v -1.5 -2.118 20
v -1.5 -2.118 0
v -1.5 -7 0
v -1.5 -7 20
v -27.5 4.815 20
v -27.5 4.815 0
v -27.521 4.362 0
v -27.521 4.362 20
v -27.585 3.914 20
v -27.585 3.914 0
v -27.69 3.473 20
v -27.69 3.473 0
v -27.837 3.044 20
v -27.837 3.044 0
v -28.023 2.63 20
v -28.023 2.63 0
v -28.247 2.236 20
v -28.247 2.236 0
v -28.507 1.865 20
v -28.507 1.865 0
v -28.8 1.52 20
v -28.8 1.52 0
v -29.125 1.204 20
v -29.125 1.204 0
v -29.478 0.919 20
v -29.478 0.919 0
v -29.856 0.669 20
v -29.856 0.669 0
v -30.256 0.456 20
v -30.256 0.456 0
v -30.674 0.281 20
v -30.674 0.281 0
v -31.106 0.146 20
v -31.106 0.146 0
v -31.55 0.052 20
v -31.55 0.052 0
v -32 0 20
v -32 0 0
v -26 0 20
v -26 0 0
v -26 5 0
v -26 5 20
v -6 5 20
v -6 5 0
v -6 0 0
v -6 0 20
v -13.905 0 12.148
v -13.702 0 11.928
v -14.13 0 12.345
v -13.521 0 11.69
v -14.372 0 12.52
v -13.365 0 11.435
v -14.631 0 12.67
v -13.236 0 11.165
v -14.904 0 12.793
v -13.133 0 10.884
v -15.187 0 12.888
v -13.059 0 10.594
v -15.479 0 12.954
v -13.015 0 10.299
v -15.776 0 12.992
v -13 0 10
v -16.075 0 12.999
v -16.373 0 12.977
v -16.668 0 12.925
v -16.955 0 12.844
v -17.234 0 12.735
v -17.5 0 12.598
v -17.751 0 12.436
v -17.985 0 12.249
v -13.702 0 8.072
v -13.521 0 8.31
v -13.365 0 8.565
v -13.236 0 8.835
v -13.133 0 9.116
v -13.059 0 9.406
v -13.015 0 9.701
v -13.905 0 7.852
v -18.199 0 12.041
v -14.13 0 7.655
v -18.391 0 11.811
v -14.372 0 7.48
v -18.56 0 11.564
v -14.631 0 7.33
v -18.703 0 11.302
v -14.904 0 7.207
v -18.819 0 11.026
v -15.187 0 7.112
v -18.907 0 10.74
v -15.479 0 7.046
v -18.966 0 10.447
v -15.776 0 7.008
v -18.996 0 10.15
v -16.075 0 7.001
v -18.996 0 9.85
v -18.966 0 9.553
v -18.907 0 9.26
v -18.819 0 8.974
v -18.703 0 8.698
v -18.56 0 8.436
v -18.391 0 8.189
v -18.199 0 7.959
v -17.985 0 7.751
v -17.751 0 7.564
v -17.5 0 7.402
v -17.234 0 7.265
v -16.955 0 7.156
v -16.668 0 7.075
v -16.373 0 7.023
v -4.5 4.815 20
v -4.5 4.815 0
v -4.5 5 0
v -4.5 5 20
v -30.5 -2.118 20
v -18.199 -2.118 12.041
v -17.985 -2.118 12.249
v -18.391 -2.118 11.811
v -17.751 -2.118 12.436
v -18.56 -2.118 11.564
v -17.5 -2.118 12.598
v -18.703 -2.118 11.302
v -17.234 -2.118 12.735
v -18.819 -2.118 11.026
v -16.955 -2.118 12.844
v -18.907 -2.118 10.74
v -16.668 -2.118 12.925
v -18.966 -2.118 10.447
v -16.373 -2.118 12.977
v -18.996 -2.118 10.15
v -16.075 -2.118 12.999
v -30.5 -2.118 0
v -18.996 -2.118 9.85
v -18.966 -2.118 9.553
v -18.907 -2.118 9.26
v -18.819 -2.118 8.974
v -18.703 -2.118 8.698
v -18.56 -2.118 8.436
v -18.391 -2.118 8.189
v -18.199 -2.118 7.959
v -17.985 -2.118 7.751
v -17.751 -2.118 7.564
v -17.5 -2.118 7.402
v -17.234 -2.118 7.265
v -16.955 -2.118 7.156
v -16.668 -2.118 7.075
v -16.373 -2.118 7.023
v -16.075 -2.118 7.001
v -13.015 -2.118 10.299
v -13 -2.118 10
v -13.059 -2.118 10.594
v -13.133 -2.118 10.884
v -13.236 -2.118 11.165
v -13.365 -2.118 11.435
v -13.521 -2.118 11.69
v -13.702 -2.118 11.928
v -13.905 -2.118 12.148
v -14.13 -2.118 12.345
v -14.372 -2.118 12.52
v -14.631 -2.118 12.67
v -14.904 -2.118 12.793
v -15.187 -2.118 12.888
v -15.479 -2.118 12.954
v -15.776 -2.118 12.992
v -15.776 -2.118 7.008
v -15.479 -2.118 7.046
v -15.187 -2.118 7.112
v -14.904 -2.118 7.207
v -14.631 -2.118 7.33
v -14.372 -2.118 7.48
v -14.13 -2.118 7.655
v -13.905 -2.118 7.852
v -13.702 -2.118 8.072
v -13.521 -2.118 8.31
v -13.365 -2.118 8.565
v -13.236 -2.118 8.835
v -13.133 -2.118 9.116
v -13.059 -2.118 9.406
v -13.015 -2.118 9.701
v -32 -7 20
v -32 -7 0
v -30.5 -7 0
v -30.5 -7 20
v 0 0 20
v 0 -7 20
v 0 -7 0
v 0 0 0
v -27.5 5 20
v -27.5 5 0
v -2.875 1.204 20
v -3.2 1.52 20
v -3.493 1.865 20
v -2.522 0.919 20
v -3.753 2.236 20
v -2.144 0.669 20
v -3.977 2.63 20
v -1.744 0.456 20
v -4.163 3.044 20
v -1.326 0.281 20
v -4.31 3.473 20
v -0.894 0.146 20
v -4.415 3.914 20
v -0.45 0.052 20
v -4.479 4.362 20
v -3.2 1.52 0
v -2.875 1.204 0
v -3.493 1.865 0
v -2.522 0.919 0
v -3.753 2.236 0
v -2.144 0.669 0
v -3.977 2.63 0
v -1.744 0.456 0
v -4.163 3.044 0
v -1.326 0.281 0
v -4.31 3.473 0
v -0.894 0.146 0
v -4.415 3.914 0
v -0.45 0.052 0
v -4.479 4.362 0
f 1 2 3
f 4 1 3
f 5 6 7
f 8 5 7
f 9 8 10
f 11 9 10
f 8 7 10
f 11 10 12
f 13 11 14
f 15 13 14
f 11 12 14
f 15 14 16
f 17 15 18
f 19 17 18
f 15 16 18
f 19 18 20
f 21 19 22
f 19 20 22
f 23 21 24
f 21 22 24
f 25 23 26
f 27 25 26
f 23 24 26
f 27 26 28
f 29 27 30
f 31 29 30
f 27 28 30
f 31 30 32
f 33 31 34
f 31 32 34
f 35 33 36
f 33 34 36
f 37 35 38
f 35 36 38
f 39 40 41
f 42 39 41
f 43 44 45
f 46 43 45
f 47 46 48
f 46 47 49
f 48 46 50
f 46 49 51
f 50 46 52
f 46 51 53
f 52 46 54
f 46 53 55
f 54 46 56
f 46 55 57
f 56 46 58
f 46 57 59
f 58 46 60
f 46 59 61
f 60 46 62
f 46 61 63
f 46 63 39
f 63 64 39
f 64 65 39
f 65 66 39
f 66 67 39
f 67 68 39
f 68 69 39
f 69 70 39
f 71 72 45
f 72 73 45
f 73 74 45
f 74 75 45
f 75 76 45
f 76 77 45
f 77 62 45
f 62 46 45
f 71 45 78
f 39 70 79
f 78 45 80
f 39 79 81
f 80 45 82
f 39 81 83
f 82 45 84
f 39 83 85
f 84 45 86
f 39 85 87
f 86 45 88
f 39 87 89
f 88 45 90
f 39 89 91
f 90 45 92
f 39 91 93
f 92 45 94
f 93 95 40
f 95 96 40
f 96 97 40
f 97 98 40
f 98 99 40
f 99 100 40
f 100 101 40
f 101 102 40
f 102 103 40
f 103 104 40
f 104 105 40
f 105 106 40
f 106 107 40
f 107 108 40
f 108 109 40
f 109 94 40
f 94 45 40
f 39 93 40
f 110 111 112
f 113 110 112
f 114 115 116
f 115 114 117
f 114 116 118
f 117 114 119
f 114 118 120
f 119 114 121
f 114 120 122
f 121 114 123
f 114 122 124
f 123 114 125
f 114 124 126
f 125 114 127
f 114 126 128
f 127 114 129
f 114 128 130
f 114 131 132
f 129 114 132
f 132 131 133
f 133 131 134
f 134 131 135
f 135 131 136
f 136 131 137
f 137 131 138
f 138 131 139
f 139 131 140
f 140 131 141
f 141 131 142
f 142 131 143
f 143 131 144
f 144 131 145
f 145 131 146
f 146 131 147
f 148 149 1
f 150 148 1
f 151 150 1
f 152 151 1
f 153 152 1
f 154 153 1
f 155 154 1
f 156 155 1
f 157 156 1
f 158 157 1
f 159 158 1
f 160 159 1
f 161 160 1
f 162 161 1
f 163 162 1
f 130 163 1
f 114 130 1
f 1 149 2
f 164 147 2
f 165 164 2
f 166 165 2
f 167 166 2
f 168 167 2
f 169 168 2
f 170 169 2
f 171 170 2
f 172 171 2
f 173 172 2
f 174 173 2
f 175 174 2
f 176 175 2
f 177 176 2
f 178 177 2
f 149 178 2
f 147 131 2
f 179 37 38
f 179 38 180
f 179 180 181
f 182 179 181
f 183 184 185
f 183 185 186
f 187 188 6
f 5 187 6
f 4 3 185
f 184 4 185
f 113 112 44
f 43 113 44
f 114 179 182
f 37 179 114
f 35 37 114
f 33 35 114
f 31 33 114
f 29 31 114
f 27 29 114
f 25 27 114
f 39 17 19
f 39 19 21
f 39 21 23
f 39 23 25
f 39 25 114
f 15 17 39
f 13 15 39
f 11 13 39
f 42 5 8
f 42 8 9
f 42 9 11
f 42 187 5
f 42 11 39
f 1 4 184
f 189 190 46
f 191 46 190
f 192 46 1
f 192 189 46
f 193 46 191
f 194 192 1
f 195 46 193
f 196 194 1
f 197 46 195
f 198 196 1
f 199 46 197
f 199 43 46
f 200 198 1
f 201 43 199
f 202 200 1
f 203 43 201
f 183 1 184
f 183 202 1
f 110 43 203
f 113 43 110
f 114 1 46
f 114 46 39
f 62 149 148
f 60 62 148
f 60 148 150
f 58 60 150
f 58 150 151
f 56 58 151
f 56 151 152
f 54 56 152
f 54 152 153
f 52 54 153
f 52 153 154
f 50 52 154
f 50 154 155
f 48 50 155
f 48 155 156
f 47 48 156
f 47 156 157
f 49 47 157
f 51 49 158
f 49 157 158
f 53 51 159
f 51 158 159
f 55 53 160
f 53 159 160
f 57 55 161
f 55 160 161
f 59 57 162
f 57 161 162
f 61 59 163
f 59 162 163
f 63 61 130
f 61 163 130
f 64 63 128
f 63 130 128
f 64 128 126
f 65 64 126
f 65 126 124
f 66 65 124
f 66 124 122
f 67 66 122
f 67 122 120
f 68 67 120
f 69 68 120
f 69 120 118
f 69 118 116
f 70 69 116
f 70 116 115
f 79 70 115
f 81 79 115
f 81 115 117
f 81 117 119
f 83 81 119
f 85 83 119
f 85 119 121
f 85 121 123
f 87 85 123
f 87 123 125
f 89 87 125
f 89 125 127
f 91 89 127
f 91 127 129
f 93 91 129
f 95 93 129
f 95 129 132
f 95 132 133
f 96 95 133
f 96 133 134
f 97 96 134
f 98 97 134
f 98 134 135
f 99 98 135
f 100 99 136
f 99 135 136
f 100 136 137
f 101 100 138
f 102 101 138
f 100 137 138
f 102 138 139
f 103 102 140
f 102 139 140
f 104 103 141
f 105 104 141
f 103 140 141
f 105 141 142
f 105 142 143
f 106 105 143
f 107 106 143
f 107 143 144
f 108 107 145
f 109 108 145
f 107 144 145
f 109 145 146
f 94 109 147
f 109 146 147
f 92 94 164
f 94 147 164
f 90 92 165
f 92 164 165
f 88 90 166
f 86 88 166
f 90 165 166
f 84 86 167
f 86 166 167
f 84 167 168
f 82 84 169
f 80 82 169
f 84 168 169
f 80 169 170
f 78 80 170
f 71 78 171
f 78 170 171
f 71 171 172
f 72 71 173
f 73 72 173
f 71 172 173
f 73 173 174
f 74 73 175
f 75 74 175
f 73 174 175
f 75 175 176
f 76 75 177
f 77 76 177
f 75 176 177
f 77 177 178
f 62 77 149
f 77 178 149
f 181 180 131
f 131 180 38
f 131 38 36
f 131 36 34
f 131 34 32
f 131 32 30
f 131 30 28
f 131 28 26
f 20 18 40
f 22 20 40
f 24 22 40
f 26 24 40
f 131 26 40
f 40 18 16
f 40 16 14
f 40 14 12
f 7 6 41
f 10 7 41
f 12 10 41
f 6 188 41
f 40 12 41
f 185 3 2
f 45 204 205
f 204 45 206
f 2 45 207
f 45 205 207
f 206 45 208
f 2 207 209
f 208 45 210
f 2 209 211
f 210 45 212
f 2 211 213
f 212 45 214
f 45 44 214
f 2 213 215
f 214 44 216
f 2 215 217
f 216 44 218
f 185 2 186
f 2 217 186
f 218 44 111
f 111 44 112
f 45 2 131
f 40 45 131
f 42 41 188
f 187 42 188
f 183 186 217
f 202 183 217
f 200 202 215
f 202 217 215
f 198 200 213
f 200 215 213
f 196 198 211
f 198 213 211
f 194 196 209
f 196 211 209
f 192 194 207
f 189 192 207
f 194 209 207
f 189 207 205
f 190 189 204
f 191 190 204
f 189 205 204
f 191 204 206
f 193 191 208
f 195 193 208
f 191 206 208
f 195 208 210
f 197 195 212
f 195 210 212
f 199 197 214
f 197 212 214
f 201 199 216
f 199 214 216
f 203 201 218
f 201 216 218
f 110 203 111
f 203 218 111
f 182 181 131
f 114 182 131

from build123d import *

# Parameters (mm, degrees)
F1_DEPTH    = 20
F2_T1_DEPTH = 20
F3_R        = 3
F4_DEPTH    = 25


# Not quite as in the source:
# - a fillet or chamfer that OpenCascade refuses, or shapes differently, is made with other operations: its cross-section is extruded or revolved along the edge and cut away or added


with BuildPart() as f1:
    # F0 (on Top) → F1 (new body)
    with BuildSketch(Plane.XY):
        Polygon((0, -7), (0, 0), (-4.5, 0), (-4.5, 5), (-6, 5), (-6, 0), (-26, 0), (-26, 5), (-27.5, 5), (-27.5, 0), (-32, 0), (-32, -7), (-30.5, -7), (-30.5, -2.1179924456), (-1.5, -2.1179924456), (-1.5, -7), align=None)
    extrude(amount=F1_DEPTH)

    # F2: fillet of radius 4.8260129112 on 2 edges, made by hand

    # F2_s2 → F2_t1 (join)
    with BuildSketch(Plane.XY):
        with BuildLine():
            ThreePointArc((-27.5, 4.814988702), (-28.8001269844, 1.5197604777), (-32, 0))
            Line((-32, 0), (-27.5, 0))
            Line((-27.5, 0), (-27.5, 4.814988702))
        make_face()
        with BuildLine():
            ThreePointArc((0, 0), (-3.1998730156, 1.5197604777), (-4.5, 4.814988702))
            Line((-4.5, 4.814988702), (-4.5, 0))
            Line((-4.5, 0), (0, 0))
        make_face()
    extrude(amount=F2_T1_DEPTH)

    # F3 (on face) → F4 (cut)
    with BuildSketch(Plane.XZ.offset(2.1179924456)):
        with Locations((-16, 10)):
            Circle(F3_R)
    extrude(amount=-F4_DEPTH, mode=Mode.SUBTRACT)


solid = f1.part
